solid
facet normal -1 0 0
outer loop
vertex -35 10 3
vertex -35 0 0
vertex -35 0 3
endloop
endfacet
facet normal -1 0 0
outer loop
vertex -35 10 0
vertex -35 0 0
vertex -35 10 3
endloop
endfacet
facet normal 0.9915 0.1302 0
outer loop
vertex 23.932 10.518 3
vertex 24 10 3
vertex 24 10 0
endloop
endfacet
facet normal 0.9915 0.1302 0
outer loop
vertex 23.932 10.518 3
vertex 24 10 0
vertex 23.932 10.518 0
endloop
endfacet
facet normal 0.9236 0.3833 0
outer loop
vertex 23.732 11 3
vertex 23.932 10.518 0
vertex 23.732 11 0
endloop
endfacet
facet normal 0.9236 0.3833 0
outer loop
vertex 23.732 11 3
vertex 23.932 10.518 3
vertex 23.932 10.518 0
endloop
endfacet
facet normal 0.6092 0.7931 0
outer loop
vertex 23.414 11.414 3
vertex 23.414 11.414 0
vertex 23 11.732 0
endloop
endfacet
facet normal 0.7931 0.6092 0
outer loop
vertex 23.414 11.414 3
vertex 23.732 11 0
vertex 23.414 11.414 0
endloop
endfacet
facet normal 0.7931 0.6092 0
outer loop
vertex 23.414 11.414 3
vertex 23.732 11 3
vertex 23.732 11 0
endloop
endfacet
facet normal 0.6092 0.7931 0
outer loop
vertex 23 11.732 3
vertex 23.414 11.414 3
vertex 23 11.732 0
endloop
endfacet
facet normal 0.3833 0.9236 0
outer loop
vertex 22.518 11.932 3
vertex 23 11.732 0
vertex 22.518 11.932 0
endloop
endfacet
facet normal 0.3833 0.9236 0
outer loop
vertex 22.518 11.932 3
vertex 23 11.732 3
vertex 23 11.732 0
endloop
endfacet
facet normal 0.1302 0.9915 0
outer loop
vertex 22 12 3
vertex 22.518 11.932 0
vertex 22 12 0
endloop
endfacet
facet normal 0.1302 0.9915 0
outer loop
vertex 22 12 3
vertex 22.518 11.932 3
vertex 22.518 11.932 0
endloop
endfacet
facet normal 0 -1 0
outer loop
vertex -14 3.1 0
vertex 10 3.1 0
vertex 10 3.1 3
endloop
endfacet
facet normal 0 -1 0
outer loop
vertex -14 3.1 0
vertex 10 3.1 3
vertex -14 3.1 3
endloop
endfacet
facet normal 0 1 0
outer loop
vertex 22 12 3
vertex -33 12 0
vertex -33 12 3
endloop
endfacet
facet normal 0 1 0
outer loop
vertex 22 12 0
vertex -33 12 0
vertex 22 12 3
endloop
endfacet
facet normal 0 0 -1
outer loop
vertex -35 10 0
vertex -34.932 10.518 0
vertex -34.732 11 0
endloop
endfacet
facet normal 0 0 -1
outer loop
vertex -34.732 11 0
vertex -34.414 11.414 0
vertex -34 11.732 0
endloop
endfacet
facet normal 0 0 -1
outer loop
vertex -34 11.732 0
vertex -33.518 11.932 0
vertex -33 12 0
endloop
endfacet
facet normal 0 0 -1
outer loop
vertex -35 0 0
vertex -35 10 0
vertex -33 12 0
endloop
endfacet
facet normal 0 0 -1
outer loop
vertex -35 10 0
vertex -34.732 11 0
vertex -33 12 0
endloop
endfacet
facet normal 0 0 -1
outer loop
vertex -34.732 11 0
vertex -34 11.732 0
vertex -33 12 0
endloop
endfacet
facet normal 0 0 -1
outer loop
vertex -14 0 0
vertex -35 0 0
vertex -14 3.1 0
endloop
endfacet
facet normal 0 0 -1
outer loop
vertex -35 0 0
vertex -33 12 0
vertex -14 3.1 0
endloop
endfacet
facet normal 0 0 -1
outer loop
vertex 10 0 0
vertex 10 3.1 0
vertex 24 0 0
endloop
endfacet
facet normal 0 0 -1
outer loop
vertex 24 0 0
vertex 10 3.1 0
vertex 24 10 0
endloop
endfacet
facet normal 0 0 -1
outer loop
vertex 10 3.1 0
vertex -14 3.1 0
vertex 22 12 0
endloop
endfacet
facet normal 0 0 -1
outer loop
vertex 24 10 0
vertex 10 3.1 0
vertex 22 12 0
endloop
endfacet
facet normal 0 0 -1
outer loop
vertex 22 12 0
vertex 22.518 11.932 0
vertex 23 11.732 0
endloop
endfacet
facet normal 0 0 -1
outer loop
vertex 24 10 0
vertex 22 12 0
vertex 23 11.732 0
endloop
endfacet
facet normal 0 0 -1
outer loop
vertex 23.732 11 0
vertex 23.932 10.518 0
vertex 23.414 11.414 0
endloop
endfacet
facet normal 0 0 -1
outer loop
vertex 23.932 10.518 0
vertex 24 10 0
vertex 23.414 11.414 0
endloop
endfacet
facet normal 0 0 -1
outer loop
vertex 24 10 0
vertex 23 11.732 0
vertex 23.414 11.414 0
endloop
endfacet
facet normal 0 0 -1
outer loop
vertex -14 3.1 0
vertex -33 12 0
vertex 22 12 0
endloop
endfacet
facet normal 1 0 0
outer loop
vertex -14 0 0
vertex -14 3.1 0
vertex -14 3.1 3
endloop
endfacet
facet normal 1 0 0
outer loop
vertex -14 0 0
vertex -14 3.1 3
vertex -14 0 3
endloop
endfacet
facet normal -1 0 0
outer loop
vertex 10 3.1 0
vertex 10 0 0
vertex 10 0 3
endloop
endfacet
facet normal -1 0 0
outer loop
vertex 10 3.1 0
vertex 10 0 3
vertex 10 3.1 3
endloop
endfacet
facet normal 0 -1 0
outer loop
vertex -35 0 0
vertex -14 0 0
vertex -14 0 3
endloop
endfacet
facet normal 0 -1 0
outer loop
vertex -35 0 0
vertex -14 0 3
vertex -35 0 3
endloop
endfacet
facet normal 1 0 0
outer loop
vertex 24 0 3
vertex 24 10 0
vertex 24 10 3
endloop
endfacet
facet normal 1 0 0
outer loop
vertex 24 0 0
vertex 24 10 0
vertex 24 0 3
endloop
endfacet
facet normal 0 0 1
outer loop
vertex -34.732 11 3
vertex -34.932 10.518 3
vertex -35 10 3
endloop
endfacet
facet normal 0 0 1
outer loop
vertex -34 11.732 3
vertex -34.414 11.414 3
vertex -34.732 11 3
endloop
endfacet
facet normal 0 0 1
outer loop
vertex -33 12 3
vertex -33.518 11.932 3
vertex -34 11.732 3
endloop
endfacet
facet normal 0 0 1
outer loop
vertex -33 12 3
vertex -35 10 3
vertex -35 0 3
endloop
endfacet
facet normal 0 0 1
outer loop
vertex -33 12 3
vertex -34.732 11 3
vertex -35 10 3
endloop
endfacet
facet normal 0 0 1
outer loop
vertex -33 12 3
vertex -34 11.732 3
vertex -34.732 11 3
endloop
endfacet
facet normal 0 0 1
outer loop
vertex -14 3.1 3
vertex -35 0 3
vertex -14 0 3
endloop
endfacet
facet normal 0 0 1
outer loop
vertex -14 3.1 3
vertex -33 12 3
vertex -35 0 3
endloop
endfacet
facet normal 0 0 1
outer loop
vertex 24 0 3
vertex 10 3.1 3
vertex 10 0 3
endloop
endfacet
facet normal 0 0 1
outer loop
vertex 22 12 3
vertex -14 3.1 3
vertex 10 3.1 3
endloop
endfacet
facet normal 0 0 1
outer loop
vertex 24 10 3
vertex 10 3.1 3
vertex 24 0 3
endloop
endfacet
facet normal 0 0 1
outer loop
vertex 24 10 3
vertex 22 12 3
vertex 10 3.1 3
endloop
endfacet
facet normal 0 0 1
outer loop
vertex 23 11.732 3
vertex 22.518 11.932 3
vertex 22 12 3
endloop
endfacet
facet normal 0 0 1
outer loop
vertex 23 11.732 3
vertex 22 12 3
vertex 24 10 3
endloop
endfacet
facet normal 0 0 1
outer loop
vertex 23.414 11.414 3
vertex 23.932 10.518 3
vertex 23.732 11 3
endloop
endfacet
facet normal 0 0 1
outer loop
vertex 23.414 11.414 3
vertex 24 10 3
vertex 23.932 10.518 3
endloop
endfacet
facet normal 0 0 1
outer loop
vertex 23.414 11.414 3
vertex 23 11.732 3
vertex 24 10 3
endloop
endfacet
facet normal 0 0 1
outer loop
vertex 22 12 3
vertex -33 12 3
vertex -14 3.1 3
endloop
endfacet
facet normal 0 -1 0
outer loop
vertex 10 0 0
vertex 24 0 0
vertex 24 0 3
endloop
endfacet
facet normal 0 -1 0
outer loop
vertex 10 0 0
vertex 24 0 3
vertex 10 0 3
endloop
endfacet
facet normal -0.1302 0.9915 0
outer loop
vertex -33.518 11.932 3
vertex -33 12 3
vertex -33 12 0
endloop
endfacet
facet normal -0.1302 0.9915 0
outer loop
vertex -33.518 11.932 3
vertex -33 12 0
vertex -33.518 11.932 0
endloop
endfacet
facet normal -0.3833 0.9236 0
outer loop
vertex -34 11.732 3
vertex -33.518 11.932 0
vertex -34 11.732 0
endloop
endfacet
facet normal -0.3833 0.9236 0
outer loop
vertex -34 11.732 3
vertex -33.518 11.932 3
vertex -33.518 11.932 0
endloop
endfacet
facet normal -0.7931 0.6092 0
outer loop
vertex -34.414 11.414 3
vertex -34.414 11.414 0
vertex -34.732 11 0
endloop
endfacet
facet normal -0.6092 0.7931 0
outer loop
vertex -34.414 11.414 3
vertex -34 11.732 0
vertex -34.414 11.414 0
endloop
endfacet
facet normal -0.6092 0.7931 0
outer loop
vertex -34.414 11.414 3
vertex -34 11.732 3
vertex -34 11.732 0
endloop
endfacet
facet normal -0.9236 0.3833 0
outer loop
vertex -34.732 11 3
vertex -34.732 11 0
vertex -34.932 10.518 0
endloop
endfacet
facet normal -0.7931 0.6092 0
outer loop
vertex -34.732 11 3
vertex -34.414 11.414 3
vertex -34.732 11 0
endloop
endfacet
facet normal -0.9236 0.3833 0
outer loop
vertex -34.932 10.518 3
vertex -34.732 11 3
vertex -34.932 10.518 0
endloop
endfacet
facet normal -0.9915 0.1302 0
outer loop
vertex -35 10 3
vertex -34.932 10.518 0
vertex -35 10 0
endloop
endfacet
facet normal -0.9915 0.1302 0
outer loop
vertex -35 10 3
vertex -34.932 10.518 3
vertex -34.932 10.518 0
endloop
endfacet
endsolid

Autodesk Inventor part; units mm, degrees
ref_plane "YZ Plane" through (0, 0, 0) normal (1, 0, 0) x (0, 1, 0)
ref_plane "XZ Plane" through (0, 0, 0) normal (0, 1, 0) x (-1, 0, 0)
ref_plane "XY Plane" through (0, 0, 0) normal (0, 0, 1) x (1, 0, 0)
sketch "Sketch1" plane through (0, 0, 0) normal (0, 0, 1) x (1, 0, 0)
  line L0 (-35, 0) -> (-35, 12)
  line L1 (-35, 12) -> (24, 12)
  line L2 (24, 12) -> (24, 0)
  line L3 (24, 0) -> (10, 0)
  line L4 (10, 0) -> (10, 3.1)
  line L5 (10, 3.1) -> (-14, 3.1)
  line L6 (-14, 3.1) -> (-14, 0)
  line L7 (-14, 0) -> (-35, 0)
  line L8 (0, 0) -> (0, 12) construction
  line L9 (-14, 0) -> (0, 0) construction
  dimension "d0" = 3.1
  dimension "d1" = 24
  dimension "d3" = 12
  dimension "d7" = 10
  dimension "d8" = 24
  dimension "d9" = 35
extrude "Extrusion1" add sketch "Sketch1" along normal blind 3
fillet "Fillet1" radius 2 2 edges at (-35, 12, 1.5) (24, 12, 1.5)
properties part number "shovel_support"
